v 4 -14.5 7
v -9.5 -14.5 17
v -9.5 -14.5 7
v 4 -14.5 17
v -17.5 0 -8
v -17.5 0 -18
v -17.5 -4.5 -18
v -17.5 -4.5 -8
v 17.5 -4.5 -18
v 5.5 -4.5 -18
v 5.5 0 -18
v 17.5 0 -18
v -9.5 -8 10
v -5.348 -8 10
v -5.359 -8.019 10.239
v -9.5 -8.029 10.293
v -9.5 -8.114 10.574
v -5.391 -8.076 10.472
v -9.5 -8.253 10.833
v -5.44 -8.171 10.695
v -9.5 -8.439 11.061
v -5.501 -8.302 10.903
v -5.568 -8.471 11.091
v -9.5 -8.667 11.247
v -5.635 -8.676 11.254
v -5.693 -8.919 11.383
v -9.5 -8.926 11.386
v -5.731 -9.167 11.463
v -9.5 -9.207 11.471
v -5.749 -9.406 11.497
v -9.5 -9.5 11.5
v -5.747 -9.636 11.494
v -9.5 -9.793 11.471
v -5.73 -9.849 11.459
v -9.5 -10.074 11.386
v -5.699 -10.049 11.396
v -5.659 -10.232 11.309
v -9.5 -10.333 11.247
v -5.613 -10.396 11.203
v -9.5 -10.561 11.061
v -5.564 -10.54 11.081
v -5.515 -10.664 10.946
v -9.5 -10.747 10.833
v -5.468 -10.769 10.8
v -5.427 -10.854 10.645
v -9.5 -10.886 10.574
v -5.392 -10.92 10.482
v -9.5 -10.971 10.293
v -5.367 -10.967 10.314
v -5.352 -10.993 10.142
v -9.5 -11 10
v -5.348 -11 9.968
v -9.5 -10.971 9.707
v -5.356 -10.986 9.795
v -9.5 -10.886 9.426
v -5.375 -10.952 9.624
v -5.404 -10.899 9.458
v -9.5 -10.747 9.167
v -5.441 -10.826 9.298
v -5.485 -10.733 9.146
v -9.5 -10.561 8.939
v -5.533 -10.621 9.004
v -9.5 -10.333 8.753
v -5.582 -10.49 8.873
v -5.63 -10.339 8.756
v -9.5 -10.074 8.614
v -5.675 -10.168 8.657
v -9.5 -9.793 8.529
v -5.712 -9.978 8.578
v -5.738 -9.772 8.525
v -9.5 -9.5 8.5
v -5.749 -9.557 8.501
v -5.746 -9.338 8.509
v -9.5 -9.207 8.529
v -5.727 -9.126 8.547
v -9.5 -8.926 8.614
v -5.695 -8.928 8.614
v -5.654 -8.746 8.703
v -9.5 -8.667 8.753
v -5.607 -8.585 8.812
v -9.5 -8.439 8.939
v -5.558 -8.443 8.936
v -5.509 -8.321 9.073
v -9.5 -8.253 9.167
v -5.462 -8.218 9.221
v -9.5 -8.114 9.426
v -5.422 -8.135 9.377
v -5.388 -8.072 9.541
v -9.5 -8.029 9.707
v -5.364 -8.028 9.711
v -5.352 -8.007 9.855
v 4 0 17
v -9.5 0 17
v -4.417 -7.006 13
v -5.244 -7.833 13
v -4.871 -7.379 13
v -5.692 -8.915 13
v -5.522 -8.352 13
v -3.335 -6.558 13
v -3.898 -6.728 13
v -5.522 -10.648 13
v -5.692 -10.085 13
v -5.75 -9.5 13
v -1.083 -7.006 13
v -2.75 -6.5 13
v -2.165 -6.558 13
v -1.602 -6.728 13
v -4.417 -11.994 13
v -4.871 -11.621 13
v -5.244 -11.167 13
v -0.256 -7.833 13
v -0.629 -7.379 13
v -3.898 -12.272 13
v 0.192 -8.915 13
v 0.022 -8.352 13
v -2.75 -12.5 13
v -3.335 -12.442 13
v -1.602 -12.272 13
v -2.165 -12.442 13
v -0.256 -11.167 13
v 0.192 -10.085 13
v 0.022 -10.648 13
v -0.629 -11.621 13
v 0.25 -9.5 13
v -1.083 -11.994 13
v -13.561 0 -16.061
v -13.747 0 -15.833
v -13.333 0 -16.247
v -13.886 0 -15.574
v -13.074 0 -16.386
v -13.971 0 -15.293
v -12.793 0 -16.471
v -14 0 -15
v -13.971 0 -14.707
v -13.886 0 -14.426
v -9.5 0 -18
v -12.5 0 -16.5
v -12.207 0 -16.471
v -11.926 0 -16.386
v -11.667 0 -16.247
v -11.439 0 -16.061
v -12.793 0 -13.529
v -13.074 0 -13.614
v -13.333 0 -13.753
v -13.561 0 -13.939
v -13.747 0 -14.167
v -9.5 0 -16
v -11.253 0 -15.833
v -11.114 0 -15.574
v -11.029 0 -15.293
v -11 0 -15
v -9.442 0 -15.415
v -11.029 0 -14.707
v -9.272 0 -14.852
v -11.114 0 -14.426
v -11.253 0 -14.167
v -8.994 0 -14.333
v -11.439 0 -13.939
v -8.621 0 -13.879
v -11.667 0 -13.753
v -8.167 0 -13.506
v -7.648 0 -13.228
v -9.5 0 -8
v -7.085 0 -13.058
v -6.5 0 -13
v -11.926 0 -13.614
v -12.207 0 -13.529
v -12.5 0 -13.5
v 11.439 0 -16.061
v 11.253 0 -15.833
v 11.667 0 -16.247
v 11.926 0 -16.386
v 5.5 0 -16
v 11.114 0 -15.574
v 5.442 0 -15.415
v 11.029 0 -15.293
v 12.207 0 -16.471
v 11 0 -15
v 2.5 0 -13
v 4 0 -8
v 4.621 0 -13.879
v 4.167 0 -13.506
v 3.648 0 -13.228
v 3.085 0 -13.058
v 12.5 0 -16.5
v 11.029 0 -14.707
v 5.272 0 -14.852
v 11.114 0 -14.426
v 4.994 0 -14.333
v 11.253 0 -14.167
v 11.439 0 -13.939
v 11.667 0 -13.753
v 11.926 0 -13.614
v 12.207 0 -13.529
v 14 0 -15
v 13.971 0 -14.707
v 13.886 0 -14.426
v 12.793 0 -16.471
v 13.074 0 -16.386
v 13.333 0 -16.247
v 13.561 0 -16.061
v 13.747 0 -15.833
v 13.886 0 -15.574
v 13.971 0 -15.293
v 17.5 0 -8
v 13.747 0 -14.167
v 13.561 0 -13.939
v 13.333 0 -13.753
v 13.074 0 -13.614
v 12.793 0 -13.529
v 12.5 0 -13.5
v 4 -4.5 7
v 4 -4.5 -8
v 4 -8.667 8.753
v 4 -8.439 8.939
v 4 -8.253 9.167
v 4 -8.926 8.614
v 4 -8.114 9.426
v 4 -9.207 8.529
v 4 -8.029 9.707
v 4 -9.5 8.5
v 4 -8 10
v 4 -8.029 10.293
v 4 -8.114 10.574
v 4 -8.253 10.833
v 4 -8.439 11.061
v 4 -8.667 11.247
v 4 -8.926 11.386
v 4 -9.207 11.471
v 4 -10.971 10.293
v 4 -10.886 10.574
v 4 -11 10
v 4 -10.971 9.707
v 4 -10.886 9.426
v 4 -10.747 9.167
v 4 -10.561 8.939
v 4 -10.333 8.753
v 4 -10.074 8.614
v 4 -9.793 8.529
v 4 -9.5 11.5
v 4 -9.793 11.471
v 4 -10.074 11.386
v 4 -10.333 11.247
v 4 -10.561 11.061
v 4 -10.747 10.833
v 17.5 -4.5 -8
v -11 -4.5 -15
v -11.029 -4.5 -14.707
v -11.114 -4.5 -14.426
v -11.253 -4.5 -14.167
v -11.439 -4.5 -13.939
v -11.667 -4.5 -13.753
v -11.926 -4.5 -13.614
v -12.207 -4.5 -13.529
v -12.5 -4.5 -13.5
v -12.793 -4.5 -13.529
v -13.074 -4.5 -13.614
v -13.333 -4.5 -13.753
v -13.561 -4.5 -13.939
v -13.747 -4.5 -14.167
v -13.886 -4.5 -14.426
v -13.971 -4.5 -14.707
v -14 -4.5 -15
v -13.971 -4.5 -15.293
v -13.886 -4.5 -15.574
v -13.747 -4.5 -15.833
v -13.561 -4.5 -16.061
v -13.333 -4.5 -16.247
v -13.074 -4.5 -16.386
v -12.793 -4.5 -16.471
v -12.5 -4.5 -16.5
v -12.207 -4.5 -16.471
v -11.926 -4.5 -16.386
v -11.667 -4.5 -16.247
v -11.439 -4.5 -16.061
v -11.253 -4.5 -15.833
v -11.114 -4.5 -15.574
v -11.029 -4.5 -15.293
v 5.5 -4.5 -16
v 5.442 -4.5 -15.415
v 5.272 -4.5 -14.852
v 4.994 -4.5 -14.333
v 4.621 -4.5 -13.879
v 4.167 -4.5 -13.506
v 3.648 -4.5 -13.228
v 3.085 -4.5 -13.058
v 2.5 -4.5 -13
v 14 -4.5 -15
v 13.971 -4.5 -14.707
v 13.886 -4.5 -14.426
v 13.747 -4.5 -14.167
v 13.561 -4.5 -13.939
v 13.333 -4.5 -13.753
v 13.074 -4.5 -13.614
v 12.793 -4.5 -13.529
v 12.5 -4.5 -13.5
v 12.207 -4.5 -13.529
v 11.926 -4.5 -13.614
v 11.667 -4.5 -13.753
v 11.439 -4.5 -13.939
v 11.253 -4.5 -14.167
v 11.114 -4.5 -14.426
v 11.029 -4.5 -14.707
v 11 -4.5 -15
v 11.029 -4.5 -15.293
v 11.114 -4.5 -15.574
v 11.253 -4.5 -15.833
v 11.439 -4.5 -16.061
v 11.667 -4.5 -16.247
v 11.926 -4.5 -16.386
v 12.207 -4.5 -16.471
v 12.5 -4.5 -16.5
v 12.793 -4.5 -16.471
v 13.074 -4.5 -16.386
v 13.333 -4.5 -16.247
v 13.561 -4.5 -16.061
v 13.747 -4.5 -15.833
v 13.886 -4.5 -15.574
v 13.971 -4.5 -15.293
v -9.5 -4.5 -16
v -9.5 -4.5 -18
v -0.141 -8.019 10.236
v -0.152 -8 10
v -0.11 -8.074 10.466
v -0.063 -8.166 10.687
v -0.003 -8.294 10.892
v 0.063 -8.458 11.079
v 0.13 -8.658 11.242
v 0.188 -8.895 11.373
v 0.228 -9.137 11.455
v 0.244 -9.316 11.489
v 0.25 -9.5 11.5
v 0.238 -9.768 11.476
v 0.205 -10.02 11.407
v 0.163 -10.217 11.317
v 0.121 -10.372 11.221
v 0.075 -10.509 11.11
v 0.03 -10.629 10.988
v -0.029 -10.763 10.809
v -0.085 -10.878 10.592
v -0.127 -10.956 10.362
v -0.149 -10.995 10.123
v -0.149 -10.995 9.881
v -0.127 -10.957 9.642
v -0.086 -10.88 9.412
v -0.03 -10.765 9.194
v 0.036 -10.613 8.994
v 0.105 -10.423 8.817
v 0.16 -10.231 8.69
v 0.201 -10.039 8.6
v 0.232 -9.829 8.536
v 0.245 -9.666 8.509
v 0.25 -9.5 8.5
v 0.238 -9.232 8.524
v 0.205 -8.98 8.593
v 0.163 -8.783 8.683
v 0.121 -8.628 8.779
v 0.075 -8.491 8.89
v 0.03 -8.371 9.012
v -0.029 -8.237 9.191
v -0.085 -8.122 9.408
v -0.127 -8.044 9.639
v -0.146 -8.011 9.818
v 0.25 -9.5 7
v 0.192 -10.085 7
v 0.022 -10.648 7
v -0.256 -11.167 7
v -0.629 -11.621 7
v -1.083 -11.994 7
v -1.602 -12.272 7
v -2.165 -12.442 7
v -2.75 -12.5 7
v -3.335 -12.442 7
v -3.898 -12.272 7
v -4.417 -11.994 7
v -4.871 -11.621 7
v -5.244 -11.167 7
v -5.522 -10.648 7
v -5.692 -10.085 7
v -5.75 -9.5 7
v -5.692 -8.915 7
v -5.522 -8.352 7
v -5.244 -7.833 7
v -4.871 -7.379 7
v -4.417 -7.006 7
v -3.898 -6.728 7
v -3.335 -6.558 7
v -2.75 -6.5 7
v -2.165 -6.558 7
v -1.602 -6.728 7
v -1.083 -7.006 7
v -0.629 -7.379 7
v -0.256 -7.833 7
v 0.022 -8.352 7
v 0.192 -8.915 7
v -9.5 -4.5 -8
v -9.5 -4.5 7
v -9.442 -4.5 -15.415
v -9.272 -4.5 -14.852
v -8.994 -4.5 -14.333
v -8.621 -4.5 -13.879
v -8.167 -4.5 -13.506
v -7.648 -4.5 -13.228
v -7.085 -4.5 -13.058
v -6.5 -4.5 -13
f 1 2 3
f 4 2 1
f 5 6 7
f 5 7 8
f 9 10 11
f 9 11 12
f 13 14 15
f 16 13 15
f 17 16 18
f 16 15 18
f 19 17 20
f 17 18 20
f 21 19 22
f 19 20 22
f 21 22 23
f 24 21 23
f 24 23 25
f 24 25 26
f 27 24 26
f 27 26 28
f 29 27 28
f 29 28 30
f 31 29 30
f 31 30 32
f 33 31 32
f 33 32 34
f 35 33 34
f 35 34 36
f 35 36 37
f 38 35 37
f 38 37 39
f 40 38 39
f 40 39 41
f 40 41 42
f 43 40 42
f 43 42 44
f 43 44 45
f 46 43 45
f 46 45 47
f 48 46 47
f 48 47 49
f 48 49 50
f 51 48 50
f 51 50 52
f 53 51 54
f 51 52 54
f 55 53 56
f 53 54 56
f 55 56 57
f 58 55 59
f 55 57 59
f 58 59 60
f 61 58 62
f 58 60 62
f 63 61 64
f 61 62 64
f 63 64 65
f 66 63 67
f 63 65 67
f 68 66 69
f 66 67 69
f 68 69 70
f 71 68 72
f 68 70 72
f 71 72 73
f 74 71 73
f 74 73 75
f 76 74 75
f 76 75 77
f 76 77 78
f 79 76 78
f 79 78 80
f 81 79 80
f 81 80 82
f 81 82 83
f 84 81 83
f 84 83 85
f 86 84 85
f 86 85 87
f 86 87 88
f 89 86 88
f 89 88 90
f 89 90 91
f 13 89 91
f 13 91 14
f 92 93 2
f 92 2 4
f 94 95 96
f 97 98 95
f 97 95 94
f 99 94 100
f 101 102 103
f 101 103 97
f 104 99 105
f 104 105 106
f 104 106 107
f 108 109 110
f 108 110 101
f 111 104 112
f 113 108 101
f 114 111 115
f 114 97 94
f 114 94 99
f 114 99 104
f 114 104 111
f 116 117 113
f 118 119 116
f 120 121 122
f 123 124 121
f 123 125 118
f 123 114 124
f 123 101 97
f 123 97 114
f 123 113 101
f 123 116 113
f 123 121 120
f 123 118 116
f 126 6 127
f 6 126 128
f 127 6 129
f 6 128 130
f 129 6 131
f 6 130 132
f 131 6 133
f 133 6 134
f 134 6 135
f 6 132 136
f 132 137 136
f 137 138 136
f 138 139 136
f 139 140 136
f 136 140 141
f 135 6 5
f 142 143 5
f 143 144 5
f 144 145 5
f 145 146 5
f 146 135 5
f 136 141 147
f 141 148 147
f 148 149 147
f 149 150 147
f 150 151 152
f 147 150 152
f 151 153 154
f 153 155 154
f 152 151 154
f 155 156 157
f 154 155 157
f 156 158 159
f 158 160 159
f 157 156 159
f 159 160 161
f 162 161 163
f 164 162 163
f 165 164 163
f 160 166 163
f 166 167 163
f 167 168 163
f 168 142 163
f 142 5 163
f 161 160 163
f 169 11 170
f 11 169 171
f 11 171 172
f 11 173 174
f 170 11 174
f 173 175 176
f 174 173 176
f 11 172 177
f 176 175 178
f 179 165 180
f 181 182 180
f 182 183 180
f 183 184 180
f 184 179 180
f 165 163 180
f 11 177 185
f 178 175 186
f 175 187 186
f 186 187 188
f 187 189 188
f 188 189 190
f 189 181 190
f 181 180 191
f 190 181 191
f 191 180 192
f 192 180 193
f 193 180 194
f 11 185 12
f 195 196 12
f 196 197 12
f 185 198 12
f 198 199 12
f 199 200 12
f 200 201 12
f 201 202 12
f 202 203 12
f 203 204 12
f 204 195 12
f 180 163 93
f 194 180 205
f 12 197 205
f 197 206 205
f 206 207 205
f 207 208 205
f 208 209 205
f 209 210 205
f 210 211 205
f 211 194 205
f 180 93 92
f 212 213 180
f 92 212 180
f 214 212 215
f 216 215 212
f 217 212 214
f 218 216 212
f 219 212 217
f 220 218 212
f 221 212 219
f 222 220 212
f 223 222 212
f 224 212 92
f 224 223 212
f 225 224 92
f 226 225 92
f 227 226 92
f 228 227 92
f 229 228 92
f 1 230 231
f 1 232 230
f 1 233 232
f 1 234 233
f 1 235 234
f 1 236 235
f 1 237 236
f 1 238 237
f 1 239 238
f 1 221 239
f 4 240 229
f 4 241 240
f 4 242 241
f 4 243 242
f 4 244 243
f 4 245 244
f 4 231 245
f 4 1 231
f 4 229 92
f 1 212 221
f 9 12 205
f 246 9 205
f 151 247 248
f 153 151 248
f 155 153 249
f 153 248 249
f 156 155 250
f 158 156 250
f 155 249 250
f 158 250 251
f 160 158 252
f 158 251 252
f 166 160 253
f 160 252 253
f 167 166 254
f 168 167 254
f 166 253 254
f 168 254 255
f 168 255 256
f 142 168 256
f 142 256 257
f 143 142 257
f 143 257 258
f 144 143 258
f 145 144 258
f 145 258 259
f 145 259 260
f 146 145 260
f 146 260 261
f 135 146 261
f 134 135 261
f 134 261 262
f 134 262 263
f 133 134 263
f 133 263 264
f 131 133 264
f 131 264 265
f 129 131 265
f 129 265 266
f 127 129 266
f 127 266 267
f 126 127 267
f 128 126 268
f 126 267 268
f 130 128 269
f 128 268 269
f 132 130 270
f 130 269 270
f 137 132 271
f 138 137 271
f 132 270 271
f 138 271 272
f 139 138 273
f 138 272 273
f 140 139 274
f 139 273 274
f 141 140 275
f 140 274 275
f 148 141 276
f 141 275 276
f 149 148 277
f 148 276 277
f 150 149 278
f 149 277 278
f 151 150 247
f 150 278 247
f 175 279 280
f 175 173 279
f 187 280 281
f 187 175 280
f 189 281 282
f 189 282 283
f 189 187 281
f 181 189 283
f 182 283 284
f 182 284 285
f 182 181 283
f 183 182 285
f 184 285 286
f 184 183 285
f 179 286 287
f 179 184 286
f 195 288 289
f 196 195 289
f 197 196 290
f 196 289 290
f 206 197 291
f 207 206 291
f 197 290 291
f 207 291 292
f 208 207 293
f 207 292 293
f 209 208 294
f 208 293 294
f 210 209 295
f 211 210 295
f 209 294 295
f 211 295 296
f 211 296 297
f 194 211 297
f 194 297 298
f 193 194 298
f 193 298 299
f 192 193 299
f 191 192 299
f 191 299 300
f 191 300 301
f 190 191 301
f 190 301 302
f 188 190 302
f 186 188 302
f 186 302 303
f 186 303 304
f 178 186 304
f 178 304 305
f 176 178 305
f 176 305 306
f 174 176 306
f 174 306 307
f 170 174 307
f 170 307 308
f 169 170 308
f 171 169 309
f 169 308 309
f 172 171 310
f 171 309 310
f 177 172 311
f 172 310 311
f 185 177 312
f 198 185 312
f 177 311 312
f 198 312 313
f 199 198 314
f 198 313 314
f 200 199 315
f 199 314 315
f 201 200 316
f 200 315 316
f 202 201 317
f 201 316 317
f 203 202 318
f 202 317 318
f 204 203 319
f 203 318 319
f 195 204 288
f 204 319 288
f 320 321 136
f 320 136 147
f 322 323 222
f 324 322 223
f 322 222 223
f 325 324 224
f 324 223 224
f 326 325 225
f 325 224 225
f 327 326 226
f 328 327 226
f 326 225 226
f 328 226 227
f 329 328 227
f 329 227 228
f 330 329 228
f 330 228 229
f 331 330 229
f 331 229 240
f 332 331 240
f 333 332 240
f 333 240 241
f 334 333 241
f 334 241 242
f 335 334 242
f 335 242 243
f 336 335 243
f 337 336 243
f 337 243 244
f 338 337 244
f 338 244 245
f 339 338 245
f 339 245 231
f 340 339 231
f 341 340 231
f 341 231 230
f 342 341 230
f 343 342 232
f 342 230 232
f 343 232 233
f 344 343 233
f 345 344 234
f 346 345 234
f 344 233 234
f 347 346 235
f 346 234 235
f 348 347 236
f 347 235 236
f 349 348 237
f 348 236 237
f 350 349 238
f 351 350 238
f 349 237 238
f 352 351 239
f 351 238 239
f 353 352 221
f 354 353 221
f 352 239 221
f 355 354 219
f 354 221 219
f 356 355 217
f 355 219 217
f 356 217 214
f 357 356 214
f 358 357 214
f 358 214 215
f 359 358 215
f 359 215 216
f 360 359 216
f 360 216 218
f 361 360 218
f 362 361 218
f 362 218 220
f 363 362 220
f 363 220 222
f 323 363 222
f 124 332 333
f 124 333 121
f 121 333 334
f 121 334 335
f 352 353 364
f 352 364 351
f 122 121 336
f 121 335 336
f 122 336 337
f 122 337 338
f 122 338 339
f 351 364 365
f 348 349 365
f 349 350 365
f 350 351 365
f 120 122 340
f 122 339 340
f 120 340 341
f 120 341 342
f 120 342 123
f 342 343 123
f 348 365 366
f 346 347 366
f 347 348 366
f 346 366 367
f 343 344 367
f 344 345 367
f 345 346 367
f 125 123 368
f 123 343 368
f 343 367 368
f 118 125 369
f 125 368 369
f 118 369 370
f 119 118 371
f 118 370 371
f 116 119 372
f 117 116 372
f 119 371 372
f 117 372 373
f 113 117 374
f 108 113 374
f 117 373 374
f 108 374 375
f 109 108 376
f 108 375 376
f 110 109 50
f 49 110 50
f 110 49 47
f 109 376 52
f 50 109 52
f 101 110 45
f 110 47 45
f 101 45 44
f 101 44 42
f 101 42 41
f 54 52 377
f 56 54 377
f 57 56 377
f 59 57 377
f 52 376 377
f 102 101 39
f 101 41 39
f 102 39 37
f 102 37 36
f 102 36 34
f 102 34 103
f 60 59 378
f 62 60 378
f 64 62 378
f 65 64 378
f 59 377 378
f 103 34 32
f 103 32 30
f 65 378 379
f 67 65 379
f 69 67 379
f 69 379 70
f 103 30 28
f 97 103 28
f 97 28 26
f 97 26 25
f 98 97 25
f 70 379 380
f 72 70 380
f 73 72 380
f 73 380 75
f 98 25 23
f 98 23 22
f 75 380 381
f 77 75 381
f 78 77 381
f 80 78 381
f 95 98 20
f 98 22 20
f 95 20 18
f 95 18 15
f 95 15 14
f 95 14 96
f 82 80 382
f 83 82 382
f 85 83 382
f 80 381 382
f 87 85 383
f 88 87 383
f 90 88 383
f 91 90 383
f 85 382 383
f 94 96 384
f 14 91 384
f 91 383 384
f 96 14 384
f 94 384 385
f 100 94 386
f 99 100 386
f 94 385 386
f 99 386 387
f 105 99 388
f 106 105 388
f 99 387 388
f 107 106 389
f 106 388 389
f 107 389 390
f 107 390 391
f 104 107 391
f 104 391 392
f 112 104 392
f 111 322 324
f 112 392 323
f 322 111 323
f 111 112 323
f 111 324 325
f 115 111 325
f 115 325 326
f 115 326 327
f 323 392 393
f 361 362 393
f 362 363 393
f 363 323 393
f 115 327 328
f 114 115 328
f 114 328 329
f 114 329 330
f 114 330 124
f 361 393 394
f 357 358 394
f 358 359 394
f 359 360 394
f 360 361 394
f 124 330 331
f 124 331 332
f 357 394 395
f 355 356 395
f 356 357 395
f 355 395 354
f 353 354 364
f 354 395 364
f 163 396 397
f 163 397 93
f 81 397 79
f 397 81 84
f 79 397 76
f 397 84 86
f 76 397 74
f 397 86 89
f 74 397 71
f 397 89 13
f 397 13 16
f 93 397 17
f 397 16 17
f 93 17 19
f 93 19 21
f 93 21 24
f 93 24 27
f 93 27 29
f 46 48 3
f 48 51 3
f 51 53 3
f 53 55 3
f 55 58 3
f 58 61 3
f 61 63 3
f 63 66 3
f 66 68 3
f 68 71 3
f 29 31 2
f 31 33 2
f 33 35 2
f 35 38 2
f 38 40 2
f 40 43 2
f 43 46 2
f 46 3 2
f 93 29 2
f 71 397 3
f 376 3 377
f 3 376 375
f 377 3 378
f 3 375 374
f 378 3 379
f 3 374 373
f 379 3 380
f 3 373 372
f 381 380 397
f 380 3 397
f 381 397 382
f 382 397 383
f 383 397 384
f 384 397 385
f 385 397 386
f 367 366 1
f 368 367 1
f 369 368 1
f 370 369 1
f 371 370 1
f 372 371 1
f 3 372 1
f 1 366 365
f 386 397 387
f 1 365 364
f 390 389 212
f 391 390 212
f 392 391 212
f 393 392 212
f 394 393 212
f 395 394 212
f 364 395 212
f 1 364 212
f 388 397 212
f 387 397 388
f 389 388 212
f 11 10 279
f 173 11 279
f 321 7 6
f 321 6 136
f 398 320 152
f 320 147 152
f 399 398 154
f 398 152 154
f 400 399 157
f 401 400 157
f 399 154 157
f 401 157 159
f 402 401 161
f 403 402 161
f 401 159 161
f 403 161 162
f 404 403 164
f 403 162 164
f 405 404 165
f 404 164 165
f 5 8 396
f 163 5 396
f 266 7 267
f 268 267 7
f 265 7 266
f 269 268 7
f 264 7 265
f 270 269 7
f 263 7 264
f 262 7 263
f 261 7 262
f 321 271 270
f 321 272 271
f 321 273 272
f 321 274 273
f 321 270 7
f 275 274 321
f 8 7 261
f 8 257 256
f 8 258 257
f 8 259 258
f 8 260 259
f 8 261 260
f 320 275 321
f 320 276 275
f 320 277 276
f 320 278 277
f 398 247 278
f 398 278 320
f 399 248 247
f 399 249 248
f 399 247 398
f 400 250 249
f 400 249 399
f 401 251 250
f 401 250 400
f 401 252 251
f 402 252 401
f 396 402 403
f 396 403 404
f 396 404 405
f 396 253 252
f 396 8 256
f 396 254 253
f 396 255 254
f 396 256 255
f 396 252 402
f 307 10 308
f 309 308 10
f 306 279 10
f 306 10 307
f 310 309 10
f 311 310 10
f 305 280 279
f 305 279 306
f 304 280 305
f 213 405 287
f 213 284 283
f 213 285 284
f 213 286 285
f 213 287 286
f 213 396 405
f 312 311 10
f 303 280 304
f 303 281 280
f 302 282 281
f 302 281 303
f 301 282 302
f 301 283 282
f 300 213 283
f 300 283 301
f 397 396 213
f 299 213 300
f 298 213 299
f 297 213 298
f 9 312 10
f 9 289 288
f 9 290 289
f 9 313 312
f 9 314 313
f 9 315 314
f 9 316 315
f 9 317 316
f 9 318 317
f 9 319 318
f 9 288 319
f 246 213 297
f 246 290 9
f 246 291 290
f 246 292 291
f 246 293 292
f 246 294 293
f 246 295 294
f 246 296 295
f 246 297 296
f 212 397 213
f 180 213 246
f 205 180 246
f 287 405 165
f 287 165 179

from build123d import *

# Parameters (mm, degrees)
F0_W      = 35
F0_H      = 37
F1_DEPTH  = 4.5
F2_R      = 1.5
F3_DEPTH  = 10
F4_W      = 35
F4_H      = 10
F5_DEPTH  = 10
F6_R      = 3
F7_DEPTH  = 6
F8_W      = 35
F8_H      = 4.5
F9_DEPTH  = 2
F10_W     = 8
F10_H     = 25
F10_W_2   = 13.5
F11_DEPTH = 14.501
F12_W     = 15
F12_H     = 5
F13_DEPTH = 4.501
F14_R     = 3
F15_R     = 1.5
F16_DEPTH = 21.501


with BuildPart() as f1:
    # F0 (on Front) → F1 (new body)
    with BuildSketch(Plane.XZ):
        with Locations((0, -1.5)):
            Rectangle(F0_W, F0_H)
    extrude(amount=F1_DEPTH)

    # F2 (on face) → F3 (cut)
    with BuildSketch(Plane.XZ.offset(4.5)):
        with Locations((12.5, -15)):
            Circle(F2_R)
        with Locations((-12.5, -15)):
            Circle(F2_R)
    extrude(amount=-F3_DEPTH, mode=Mode.SUBTRACT)

    # F4 (on face) → F5 (join)
    with BuildSketch(Plane.XZ.offset(4.5)):
        with Locations((0, 12)):
            Rectangle(F4_W, F4_H)
    extrude(amount=F5_DEPTH)

    # F6 (on face) → F7 (cut)
    with BuildSketch(Plane(origin=(0, 0, 7), x_dir=(1, 0, 0), z_dir=(0, 0, -1))):
        with Locations((-2.75, 9.5)):
            Circle(F6_R)
    extrude(amount=-F7_DEPTH, mode=Mode.SUBTRACT)

    # F8 (on face) → F9 (cut)
    with BuildSketch(Plane(origin=(0, 0, -20), x_dir=(1, 0, 0), z_dir=(0, 0, -1))):
        with Locations((0, 2.25)):
            Rectangle(F8_W, F8_H)
    extrude(amount=-F9_DEPTH, mode=Mode.SUBTRACT)

    # F10 (on face) → F11 (cut, through all)
    with BuildSketch(Plane.XZ.offset(14.5)):
        with Locations((-13.5, 4.5)):
            Rectangle(F10_W, F10_H)
        with Locations((10.75, 4.5)):
            Rectangle(F10_W_2, F10_H)
    extrude(amount=-F11_DEPTH, mode=Mode.SUBTRACT)

    # F12 (on face) → F13 (cut, through all)
    with BuildSketch(Plane.XZ.offset(4.5)):
        with Locations((-2, -15.5)):
            Rectangle(F12_W, F12_H)
    extrude(amount=-F13_DEPTH, mode=Mode.SUBTRACT)

    # F14
    f14_edges = [f1.edges().sort_by_distance(p)[0] for p in [
        (5.5, -2.25, -13),
        (-9.5, -2.25, -13),
    ]]
    fillet(f14_edges, radius=F14_R)

    # F15 (on face) → F16 (cut, through all)
    with BuildSketch(Plane.YZ.offset(4)):
        with Locations((-9.5, 10)):
            Circle(F15_R)
    extrude(amount=-F16_DEPTH, mode=Mode.SUBTRACT)


solid = f1.part
